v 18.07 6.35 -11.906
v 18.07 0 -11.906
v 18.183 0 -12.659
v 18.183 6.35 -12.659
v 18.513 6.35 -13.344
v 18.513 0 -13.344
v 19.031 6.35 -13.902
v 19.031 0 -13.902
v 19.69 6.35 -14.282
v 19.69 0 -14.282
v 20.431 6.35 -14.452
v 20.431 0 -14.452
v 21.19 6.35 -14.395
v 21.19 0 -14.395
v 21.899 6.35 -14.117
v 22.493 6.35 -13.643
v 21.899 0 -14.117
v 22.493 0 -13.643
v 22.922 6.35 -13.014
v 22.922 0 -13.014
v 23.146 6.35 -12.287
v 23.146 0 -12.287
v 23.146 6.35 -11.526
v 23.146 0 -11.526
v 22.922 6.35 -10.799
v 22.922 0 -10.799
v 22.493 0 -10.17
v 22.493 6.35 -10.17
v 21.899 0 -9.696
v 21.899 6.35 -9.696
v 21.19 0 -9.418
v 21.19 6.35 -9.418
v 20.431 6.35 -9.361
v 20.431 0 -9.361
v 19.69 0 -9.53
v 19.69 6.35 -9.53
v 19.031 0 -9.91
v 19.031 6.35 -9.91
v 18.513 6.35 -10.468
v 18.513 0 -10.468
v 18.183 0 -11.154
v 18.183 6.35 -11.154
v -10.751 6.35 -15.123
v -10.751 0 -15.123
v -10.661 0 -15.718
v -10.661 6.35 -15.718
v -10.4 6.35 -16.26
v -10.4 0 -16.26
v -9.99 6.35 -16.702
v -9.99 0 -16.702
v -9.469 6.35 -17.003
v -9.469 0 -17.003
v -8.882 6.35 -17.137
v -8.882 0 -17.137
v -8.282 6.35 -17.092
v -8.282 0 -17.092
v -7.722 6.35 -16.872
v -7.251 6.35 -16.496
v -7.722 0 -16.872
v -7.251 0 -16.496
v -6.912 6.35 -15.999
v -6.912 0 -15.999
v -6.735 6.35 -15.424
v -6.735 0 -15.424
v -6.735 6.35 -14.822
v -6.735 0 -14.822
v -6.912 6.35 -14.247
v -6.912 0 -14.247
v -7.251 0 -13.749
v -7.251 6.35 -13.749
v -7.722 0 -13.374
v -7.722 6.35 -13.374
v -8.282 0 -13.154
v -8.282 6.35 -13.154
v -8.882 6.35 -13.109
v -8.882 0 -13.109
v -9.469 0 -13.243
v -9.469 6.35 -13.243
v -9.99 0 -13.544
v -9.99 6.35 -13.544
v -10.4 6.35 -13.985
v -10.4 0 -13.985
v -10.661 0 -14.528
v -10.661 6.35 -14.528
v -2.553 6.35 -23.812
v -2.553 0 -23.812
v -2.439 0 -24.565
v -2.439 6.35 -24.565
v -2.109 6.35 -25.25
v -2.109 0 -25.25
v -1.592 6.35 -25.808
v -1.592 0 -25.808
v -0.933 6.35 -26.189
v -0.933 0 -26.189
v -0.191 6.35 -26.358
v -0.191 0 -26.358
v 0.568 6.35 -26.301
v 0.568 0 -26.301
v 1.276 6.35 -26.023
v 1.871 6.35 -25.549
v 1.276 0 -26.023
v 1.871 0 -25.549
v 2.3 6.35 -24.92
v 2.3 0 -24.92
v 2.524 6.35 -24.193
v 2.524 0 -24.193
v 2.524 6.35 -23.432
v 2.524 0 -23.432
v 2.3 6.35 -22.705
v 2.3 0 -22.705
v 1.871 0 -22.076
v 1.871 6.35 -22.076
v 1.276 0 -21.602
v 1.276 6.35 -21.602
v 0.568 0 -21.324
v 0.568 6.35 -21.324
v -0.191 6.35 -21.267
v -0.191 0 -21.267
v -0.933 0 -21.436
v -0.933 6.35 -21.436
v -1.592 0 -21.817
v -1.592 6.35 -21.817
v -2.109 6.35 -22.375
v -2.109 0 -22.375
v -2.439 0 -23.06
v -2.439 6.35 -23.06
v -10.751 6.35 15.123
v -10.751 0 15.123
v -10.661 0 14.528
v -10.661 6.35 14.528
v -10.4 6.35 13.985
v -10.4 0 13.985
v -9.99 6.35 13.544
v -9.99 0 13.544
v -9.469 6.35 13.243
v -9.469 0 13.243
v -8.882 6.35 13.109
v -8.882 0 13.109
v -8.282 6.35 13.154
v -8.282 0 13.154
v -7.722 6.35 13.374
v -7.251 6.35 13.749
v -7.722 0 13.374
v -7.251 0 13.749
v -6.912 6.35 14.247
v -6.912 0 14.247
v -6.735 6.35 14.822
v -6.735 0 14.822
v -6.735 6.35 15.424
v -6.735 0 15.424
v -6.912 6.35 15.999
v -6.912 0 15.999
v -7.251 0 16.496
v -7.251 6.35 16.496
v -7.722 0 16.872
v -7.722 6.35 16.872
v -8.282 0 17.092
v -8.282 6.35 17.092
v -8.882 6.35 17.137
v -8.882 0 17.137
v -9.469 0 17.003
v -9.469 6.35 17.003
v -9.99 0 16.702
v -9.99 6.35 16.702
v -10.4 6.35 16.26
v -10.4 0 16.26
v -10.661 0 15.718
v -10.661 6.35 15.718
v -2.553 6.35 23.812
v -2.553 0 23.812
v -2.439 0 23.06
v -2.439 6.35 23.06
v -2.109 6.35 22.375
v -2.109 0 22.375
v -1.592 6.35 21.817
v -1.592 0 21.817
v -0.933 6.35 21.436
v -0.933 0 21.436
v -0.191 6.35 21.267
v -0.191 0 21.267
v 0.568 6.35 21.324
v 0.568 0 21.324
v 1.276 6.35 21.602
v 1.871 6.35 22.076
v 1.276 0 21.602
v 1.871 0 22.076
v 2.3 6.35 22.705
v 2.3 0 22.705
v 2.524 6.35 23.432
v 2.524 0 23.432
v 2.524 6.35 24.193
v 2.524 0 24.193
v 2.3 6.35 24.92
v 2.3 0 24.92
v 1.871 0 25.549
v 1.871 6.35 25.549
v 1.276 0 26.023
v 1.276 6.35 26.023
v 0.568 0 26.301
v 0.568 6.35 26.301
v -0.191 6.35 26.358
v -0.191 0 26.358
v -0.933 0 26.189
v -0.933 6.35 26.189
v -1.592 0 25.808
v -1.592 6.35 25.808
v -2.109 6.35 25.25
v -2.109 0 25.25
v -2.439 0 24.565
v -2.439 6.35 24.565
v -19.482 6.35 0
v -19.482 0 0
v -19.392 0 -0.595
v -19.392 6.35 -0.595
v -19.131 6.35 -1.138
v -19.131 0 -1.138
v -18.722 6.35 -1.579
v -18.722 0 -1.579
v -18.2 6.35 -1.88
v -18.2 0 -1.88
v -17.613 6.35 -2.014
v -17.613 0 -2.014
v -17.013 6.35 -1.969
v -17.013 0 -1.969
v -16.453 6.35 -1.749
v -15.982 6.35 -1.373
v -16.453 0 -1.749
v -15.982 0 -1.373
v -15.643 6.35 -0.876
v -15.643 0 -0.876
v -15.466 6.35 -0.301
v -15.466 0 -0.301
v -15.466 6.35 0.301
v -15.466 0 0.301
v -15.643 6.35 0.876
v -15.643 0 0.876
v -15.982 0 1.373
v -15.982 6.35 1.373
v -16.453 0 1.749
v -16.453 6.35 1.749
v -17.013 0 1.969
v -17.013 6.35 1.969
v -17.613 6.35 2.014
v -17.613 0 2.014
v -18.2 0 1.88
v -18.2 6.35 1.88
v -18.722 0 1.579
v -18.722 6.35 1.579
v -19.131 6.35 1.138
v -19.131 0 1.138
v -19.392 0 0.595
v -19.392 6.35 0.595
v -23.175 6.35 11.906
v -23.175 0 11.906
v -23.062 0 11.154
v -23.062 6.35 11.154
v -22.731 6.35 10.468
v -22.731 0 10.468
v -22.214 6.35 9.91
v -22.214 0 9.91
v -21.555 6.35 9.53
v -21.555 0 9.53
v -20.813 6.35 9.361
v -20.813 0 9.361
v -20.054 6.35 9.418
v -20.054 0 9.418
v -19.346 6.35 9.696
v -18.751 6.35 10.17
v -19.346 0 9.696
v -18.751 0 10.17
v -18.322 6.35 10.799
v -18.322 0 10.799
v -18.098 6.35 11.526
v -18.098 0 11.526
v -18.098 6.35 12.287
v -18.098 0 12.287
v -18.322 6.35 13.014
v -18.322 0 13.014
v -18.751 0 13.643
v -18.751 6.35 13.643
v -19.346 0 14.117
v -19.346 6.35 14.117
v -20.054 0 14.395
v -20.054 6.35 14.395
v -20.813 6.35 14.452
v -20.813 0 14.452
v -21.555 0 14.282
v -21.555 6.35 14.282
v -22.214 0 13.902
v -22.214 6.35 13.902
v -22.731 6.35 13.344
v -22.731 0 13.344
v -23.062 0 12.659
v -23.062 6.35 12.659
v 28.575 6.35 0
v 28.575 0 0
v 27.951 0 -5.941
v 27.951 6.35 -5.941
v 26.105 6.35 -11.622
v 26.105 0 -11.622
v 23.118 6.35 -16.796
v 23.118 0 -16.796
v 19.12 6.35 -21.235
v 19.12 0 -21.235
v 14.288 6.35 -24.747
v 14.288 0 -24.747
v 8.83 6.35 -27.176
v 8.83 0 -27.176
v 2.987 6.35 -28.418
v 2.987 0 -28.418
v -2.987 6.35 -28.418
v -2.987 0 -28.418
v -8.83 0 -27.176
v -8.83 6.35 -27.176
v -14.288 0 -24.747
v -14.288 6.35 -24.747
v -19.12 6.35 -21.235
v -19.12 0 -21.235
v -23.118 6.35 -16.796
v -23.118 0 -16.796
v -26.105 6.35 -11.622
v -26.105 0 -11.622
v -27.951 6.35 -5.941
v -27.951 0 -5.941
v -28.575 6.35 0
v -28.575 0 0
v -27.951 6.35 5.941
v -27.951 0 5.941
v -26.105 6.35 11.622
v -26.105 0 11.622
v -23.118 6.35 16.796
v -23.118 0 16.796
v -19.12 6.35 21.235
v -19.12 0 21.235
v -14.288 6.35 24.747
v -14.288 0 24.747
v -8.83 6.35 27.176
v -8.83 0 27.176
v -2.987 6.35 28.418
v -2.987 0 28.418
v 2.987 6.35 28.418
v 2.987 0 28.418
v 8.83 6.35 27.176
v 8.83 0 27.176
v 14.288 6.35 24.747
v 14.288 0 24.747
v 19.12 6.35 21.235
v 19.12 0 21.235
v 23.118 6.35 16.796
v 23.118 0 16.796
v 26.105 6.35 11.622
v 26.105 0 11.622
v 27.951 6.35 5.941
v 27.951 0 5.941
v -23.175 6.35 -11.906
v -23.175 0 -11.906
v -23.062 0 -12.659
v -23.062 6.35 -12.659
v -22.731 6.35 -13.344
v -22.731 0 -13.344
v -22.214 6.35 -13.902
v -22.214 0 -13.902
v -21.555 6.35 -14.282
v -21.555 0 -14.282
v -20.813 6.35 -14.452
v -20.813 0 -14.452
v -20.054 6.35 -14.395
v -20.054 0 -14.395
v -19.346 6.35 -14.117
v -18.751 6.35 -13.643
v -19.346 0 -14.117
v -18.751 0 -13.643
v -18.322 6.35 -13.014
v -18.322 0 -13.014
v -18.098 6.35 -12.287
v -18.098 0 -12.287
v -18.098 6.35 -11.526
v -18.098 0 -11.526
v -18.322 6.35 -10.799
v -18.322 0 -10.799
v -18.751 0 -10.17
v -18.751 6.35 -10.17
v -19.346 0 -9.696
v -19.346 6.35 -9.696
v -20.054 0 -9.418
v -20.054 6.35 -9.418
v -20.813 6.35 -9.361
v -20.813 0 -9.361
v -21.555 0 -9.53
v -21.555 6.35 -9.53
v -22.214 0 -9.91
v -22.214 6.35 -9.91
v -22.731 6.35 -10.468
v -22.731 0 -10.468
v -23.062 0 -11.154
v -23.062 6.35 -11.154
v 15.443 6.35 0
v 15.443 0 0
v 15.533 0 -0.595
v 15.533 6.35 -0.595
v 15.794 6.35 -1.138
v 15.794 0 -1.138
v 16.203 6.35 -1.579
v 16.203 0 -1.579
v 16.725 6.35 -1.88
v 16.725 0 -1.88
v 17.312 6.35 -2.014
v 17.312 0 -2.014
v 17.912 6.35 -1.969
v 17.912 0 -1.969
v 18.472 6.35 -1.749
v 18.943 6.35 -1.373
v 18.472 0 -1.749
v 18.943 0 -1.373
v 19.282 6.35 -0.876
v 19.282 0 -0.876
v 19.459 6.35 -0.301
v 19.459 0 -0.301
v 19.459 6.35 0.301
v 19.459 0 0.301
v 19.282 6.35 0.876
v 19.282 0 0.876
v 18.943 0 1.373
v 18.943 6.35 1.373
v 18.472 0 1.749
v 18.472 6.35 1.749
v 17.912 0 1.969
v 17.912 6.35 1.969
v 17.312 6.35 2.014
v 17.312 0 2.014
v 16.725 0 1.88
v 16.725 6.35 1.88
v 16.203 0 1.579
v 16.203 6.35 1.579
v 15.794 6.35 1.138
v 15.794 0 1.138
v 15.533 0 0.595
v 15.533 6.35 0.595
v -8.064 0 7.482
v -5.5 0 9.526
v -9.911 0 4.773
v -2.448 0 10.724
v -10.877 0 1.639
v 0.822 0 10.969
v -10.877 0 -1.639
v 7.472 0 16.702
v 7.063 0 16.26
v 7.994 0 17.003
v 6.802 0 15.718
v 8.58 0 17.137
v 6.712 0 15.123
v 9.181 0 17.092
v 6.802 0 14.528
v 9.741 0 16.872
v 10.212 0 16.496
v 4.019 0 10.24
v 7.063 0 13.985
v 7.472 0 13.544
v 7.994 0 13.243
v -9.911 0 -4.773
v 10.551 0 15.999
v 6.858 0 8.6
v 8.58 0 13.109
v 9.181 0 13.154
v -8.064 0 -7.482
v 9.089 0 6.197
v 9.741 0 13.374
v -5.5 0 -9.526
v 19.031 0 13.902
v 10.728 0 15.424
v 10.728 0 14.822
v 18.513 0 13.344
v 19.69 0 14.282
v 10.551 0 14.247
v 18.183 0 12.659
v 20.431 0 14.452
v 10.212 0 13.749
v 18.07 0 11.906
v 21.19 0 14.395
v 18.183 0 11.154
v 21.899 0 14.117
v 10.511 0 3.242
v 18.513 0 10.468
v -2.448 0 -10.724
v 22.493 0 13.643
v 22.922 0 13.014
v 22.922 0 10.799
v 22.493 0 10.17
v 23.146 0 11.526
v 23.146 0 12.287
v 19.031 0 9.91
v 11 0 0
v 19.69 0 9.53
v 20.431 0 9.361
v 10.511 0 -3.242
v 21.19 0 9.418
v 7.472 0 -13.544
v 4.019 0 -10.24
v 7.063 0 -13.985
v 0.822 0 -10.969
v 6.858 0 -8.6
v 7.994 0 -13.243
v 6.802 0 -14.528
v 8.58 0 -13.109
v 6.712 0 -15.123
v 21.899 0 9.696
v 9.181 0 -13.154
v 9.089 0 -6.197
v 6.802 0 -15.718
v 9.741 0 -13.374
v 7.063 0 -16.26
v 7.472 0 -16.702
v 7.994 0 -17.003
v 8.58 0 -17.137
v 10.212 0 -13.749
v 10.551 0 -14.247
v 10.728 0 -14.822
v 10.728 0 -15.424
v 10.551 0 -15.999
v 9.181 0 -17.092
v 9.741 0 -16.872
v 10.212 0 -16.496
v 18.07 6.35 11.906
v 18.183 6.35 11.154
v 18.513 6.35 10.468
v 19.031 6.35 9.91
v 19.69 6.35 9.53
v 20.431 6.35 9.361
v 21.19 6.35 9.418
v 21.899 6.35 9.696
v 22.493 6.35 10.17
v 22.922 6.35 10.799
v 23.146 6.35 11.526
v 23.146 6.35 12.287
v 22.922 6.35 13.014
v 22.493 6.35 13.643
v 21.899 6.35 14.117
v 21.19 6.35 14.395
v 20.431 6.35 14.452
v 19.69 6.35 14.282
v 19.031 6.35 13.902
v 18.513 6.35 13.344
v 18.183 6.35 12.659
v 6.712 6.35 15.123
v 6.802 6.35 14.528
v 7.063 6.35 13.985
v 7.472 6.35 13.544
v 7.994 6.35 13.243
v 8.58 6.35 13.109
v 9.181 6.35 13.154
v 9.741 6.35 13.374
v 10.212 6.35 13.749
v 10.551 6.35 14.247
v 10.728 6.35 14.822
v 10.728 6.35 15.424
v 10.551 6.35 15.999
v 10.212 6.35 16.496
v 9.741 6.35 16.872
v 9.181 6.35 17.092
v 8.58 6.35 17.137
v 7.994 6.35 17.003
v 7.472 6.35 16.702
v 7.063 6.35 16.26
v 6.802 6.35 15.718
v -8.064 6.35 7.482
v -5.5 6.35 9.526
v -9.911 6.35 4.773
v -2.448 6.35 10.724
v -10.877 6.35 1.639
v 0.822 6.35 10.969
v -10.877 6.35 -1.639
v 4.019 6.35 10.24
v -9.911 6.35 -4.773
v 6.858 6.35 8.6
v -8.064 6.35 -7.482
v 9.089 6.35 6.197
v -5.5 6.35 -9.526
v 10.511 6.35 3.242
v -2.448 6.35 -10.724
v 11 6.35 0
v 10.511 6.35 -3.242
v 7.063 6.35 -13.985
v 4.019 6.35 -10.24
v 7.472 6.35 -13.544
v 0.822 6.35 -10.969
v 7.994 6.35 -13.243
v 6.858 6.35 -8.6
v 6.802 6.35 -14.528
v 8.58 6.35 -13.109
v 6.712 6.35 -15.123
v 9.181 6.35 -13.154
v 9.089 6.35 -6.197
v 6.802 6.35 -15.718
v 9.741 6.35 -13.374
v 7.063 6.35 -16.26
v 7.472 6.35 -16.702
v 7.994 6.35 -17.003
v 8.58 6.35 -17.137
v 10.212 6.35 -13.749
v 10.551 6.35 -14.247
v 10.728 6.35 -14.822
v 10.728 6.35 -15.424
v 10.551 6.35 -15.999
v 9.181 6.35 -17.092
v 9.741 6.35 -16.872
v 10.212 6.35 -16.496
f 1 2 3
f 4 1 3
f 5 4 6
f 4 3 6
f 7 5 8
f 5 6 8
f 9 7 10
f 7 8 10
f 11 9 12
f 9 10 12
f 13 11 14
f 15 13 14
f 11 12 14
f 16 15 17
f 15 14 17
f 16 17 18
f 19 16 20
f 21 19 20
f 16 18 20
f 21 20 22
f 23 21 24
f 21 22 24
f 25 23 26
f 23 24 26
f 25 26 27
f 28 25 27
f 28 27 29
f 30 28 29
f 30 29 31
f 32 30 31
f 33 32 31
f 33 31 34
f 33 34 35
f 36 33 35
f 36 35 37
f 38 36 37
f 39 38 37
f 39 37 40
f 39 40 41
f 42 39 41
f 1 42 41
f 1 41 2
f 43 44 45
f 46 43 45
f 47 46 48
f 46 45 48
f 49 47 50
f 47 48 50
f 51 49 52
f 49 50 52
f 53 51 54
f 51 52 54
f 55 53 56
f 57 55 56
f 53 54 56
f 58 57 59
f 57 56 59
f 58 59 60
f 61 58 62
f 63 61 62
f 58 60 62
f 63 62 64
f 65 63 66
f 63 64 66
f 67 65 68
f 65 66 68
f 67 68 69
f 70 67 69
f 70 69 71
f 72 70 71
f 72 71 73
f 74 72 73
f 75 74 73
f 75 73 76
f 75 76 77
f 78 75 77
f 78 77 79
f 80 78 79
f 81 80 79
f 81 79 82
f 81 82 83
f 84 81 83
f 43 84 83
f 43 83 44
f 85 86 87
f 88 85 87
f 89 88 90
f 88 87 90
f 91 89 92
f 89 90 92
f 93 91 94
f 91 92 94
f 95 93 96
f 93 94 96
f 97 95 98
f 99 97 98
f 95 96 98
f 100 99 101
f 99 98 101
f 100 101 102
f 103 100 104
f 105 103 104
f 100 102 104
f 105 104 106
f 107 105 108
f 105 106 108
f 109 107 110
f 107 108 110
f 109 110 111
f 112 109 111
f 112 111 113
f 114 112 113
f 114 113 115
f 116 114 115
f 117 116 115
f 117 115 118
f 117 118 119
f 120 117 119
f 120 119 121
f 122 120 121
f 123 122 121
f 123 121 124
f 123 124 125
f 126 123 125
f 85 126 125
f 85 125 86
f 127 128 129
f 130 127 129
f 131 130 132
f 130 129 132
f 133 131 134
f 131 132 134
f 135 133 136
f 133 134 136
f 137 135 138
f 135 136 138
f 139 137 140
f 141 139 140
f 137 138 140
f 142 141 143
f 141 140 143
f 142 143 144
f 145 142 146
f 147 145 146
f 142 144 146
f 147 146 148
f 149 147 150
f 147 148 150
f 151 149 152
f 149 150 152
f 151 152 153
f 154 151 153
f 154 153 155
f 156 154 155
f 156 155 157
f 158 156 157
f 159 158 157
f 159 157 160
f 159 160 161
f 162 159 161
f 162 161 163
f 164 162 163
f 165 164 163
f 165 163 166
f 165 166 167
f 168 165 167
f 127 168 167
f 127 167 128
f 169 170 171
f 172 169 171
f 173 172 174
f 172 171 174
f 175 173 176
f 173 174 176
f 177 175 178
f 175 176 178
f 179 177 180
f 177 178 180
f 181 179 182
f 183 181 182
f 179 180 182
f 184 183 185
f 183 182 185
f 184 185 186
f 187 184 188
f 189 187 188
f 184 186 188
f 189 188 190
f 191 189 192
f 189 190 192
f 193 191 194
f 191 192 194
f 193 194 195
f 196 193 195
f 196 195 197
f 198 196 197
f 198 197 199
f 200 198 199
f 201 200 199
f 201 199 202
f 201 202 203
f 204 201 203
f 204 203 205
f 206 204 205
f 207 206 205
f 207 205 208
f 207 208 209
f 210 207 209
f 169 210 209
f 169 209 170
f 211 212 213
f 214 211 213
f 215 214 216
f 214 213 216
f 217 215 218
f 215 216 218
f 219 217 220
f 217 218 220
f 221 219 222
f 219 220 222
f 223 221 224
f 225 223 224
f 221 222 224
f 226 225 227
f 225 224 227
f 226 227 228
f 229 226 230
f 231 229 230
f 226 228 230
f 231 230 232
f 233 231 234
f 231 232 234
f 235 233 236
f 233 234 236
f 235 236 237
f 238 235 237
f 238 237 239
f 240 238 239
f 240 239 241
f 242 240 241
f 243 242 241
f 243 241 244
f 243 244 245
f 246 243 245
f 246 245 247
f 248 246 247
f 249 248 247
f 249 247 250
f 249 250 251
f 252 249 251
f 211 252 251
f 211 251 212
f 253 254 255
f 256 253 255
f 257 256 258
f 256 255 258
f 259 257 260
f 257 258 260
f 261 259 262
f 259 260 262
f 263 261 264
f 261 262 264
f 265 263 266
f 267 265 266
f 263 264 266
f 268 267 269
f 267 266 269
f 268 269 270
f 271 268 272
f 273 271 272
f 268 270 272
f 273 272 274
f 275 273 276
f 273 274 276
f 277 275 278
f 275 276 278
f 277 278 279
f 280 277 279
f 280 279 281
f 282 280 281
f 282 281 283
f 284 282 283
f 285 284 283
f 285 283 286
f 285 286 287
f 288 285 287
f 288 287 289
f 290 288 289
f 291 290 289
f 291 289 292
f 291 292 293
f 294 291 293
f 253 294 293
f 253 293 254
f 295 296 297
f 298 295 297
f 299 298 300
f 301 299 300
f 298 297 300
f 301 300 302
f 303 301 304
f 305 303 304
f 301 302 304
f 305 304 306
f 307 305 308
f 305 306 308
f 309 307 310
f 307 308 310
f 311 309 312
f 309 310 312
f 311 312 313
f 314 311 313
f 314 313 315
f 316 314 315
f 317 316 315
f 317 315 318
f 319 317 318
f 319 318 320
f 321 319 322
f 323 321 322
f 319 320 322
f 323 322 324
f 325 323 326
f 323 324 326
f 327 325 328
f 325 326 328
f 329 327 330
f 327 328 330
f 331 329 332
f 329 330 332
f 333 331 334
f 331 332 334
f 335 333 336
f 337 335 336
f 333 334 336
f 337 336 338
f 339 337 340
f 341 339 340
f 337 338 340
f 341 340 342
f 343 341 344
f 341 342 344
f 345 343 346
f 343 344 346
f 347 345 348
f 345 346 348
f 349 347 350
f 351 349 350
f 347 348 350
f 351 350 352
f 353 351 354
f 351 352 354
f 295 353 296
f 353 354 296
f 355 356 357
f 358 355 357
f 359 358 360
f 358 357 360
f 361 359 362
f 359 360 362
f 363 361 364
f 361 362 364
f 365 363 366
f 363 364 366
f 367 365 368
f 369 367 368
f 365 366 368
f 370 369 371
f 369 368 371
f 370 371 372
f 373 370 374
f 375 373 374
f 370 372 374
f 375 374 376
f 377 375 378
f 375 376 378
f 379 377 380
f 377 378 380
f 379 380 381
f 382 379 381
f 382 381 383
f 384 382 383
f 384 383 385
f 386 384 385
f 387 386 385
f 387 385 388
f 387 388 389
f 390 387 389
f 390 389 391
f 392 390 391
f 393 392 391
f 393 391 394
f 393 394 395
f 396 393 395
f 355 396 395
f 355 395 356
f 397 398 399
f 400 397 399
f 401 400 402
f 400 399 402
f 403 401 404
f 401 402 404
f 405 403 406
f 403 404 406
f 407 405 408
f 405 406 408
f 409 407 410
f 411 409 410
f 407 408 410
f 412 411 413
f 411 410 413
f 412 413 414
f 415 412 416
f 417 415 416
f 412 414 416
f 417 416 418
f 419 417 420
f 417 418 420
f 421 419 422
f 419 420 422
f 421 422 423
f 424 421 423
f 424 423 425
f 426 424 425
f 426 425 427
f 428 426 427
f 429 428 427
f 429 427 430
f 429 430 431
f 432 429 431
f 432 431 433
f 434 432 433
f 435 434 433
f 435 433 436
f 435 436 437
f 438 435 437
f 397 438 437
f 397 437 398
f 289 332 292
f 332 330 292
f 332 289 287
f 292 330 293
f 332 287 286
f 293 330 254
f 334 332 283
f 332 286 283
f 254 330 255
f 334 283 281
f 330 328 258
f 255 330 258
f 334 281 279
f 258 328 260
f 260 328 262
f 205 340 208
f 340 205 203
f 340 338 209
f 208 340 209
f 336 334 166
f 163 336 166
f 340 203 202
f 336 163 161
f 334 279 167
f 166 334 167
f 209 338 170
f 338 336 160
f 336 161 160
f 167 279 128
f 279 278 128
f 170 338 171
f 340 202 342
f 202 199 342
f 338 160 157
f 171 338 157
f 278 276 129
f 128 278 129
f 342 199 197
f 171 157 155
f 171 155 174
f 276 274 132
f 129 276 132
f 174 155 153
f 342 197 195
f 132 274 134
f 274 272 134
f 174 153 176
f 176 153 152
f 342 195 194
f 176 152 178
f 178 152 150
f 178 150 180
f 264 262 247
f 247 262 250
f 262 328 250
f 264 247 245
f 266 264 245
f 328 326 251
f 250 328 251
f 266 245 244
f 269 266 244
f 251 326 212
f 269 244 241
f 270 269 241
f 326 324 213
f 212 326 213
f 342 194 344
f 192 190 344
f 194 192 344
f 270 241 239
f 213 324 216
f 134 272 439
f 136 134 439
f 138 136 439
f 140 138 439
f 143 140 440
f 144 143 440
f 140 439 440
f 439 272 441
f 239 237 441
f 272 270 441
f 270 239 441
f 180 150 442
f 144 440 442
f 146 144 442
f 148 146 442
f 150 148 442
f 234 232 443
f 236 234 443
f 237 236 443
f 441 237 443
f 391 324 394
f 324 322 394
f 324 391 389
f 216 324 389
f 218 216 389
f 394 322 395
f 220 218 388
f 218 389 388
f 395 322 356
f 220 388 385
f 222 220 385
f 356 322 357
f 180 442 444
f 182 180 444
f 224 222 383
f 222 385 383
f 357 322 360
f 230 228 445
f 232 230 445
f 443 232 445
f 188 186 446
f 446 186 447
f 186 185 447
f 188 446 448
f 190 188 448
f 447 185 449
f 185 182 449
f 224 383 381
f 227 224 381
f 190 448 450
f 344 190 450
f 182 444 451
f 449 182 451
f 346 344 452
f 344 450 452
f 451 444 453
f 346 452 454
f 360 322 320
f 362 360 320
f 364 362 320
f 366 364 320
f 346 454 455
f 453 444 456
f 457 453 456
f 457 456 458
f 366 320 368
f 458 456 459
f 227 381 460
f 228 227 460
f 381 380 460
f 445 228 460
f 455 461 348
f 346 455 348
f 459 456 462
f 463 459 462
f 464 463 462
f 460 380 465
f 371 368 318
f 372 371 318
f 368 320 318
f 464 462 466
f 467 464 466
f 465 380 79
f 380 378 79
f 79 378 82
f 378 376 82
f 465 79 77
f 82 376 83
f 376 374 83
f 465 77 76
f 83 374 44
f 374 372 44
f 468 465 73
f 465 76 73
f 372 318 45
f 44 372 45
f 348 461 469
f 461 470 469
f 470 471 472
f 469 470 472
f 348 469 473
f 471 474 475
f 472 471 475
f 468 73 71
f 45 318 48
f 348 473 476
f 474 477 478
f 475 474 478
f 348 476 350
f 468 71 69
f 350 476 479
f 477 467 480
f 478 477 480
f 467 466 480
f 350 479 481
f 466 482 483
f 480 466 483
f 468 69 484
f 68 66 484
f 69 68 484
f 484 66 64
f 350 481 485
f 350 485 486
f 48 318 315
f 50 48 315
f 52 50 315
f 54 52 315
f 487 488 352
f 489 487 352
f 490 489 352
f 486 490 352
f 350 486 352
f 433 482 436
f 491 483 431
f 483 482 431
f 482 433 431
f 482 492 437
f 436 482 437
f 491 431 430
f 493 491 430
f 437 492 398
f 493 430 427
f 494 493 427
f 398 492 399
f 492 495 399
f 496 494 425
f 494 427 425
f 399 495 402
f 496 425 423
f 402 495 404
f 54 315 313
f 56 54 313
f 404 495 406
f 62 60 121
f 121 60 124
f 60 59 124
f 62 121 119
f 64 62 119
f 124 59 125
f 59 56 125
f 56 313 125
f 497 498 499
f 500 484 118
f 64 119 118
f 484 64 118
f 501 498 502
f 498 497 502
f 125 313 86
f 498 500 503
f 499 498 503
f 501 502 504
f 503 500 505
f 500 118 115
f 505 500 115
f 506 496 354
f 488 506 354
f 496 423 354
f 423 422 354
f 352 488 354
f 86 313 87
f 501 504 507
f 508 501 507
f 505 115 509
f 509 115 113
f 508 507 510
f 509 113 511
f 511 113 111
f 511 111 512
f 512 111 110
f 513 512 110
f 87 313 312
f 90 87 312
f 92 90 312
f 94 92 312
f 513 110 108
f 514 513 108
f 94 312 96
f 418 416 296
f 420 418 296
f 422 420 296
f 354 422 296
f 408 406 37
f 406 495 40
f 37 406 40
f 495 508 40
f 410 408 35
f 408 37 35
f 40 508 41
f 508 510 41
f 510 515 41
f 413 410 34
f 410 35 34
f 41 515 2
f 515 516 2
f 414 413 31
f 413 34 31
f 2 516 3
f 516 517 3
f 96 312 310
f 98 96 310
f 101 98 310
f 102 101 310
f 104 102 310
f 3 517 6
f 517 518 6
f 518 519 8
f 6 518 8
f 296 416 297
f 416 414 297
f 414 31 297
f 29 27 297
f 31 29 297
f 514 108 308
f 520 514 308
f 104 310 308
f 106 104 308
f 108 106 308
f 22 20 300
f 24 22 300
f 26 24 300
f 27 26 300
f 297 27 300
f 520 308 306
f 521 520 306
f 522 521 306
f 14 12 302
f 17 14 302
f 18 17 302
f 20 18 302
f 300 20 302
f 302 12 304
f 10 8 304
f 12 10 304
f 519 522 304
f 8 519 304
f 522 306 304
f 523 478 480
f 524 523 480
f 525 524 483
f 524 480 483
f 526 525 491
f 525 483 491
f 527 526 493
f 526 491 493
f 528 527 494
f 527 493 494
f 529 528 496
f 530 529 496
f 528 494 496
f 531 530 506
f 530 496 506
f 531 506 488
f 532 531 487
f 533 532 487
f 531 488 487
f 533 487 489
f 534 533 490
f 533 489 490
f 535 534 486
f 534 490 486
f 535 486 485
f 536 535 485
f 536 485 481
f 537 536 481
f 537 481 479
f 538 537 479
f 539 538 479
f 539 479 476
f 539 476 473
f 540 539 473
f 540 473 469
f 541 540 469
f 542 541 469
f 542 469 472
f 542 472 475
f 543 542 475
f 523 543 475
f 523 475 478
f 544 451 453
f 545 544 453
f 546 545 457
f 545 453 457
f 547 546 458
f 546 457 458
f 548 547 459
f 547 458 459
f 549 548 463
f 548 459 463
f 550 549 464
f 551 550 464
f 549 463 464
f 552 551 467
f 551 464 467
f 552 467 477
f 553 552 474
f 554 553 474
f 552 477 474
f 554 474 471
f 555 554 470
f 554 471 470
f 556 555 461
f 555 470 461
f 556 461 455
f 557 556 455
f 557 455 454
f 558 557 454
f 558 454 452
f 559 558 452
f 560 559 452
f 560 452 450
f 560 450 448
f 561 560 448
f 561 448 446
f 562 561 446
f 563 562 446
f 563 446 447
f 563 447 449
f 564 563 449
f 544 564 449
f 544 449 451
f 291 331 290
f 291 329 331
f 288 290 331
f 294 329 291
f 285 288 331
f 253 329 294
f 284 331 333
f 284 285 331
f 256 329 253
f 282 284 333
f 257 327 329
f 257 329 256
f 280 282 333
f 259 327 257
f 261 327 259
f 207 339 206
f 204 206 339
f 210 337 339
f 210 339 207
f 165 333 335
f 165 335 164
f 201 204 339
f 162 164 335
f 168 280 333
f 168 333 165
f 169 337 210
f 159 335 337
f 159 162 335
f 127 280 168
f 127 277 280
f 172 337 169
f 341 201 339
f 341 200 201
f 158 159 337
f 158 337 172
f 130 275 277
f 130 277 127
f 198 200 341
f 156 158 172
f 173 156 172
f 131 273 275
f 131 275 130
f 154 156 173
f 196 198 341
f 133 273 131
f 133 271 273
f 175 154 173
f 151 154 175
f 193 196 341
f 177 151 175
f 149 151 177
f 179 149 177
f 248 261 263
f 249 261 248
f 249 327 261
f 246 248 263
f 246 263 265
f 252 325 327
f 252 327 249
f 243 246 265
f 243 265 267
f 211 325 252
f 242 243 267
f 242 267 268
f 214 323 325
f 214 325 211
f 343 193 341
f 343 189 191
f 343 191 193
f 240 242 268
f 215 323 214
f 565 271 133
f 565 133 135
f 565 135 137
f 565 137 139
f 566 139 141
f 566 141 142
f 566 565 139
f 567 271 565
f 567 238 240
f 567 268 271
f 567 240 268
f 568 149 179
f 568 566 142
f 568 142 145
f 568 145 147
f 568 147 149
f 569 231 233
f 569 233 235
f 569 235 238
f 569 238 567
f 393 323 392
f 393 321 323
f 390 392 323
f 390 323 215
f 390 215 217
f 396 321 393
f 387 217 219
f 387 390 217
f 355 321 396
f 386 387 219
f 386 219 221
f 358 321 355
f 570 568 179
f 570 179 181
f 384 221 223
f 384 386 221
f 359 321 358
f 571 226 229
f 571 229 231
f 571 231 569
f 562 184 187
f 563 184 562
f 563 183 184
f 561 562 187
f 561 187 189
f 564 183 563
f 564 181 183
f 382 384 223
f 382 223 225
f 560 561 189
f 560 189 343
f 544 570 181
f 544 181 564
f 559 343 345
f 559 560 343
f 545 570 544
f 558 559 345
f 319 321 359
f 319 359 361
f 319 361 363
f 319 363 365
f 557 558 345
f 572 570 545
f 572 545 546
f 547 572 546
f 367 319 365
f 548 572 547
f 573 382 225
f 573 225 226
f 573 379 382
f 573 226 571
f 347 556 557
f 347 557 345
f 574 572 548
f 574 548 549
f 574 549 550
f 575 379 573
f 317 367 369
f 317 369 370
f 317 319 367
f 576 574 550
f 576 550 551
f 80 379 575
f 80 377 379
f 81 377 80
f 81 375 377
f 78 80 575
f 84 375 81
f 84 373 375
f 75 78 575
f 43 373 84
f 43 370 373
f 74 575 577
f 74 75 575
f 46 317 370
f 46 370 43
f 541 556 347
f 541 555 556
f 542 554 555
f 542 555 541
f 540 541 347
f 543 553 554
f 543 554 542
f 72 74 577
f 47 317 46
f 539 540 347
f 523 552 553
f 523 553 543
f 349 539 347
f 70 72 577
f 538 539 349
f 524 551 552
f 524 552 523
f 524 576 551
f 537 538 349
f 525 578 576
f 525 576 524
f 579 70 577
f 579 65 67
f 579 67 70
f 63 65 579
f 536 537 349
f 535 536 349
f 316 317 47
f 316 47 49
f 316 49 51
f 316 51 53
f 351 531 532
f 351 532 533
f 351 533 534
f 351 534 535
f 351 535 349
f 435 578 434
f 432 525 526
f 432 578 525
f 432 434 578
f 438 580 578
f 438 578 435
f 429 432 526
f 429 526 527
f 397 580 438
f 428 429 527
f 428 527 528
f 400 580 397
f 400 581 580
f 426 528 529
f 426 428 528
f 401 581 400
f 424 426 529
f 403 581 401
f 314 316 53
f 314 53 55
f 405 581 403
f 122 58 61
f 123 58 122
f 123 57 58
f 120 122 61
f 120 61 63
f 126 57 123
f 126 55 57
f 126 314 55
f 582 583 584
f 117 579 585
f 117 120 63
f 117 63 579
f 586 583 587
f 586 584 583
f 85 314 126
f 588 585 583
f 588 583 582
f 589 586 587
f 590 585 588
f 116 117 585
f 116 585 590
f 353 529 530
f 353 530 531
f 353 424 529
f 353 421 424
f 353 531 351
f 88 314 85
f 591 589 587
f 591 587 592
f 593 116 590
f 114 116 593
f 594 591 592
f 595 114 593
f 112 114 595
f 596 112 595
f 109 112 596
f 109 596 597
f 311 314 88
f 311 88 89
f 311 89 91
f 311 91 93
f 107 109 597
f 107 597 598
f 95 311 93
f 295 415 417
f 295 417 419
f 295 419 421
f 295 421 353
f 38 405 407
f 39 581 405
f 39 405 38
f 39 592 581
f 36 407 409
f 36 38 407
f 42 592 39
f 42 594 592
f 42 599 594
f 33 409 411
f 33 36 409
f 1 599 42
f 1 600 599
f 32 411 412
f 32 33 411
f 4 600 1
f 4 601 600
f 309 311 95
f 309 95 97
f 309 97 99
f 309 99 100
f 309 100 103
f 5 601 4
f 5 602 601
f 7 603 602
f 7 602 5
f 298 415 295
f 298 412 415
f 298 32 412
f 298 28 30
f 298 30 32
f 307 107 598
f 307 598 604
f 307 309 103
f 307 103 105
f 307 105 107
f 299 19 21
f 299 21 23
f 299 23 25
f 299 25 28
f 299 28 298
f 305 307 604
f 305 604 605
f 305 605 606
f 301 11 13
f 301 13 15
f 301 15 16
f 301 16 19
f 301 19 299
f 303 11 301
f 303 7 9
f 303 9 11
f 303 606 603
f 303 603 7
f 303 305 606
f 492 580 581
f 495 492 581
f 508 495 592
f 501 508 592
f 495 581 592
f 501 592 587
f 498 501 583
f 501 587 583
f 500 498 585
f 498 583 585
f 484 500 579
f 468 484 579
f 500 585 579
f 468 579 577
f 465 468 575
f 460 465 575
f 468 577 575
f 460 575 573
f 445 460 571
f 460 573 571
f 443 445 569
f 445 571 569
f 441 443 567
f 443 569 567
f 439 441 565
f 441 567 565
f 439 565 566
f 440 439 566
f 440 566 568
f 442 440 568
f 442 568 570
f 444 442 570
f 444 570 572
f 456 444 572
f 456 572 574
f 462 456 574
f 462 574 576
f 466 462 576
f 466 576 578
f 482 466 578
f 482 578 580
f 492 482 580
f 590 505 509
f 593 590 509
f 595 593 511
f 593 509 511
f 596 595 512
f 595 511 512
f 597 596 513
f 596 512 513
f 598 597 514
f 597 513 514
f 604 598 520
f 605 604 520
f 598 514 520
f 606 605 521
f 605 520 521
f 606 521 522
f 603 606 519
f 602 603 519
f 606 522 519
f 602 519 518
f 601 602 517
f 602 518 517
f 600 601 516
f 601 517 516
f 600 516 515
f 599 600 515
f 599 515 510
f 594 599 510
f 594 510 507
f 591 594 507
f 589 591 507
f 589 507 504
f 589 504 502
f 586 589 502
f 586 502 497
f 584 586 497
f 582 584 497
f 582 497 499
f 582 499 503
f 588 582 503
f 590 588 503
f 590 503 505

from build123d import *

# Parameters (mm, degrees)
SKETCH1_R               = 28.575
BOSS_EXTRUDE1_DEPTH     = 6.35
F_1_4_20_TAPPED_HOLE1_D = 5.1054
SKETCH5_R               = 11
CUT_EXTRUDE1_DEPTH      = 7.35
F_10_32_TAPPED_HOLE1_D  = 4.0386


with BuildPart() as part:
    # Sketch1 → Boss-Extrude1 (new body)
    with BuildSketch(Plane(origin=(0, 0, 0), x_dir=(1, 0, 0), z_dir=(0, 1, 0))):
        Circle(SKETCH1_R)
    extrude(amount=BOSS_EXTRUDE1_DEPTH)

    # 1/4-20 Tapped Hole1 (through all)
    with Locations(Plane(origin=(0, 6.35, 0), x_dir=(1, 0, 0), z_dir=(0, 1, 0))):
        with Locations((0, 23.8125), (20.622229928, 11.90625), (20.622229928, -11.90625), (0, -23.8125), (-20.622229928, -11.90625), (-20.622229928, 11.90625)):
            Hole(F_1_4_20_TAPPED_HOLE1_D / 2)

    # Sketch5 → Cut-Extrude1 (cut, through all)
    with BuildSketch(Plane(origin=(0, 6.35, 0), x_dir=(1, 0, 0), z_dir=(0, 1, 0))):
        Circle(SKETCH5_R)
    extrude(amount=-CUT_EXTRUDE1_DEPTH, mode=Mode.SUBTRACT)

    # #10-32 Tapped Hole1 (through all)
    with Locations(Plane(origin=(0, 6.35, 0), x_dir=(1, 0, 0), z_dir=(0, 1, 0))):
        with Locations((-8.73125, 15.122968614), (8.73125, 15.122968614), (17.4625, 0), (8.73125, -15.122968614), (-8.73125, -15.122968614), (-17.4625, 0)):
            Hole(F_10_32_TAPPED_HOLE1_D / 2)


solid = part.part
